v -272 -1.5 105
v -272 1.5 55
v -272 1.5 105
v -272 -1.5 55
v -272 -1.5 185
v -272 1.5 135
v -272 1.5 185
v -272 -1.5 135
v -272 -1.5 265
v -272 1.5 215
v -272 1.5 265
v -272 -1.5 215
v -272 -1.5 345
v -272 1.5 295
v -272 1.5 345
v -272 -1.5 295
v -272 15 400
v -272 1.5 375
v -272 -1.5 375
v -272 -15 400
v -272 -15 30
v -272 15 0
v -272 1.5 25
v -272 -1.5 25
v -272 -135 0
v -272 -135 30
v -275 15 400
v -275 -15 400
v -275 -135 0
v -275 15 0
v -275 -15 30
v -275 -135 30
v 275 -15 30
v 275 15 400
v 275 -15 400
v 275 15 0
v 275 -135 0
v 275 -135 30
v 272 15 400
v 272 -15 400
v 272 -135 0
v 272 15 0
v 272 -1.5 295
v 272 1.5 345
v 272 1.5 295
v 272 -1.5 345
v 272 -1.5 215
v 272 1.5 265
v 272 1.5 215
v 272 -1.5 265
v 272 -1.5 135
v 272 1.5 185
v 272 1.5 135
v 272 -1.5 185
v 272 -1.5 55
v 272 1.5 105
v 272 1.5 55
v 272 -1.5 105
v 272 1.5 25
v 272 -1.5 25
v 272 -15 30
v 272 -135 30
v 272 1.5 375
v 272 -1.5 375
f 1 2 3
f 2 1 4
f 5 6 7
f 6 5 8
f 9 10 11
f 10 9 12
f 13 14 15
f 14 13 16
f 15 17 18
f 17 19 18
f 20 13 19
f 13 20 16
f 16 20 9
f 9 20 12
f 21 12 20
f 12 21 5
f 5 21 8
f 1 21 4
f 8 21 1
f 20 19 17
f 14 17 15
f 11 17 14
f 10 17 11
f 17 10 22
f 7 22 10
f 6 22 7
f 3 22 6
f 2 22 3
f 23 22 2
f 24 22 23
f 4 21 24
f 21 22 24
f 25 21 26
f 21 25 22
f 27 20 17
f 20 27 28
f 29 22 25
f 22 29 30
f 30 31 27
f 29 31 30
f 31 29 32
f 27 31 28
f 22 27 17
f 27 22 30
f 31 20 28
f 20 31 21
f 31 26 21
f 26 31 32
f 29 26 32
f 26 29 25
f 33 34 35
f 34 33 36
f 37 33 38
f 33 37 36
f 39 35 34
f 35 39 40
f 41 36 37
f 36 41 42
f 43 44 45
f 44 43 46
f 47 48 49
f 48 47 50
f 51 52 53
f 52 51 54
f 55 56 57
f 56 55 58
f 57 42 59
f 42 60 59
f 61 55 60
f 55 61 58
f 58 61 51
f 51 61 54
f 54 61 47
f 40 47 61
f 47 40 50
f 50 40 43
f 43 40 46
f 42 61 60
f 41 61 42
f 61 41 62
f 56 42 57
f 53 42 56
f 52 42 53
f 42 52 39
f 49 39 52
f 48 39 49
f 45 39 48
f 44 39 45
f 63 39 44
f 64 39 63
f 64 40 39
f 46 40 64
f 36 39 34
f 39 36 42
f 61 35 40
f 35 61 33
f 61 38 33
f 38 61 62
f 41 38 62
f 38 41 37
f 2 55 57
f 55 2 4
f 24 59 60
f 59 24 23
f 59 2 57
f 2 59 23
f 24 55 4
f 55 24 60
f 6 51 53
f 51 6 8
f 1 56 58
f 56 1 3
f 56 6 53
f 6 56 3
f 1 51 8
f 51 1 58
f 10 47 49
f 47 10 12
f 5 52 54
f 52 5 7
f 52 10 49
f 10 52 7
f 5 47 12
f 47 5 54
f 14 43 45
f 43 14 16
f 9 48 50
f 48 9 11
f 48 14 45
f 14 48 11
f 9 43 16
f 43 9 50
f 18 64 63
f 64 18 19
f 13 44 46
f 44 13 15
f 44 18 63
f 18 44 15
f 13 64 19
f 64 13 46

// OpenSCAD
// file: horizontal.scad
include <../config.scad>;

module wall_horizontal()
{
    cube([
        wall_x - 2*material_z,
        material_z,
        support_z
        ], center=true);
}

wall_horizontal();
// file: vertical.scad
include <../config.scad>;

module wall_vertical()
{
    // horizontal
    translate([
        0,
        0,
        wall_z/2
        ])
    cube([
        material_z,
        wall_width,
        wall_z
        ], center=true);

    // foot
    translate([
        0,
        -wall_y/2 + wall_width/2,
        +foot_z/2
        ])
    cube([
        material_z,
        wall_y,
        foot_z
        ], center=true);
}

wall_vertical();
// file: ../config.scad
// all measures in millimeters

// rendering quality
$fn = 200;

// material to cut from
material_z = 3;

// wall configuration: bounding box measures
wall_x = 550;
wall_y = 150;
wall_z = 400;

wall_width = 30;
foot_z = 30;

// pots are hung at wall supports
support_count = 5;
support_z = 30;

// pot configuration: outer measures of the top opening
pot_x = 70;
pot_y = 70;
pot_z = 50;

// pots have hooks to hang at the wall supports
hook_width = 10;
// main file
include <../config.scad>;
use <vertical.scad>;
use <horizontal.scad>;

module wall()
{
    // vertical parts
    for (x = [
            -wall_x/2 + material_z/2,
            +wall_x/2 - material_z/2
            ])
    {
        translate([
            x,
            0,
            0
            ])
        wall_vertical();
    }

    // horizontal parts
    delta_z = wall_z/support_count;
    for (i=[1:support_count])
    {
        translate([
            0,
            0,
            (i-0.5)*delta_z
            ])
        wall_horizontal();
    }
}

wall();
